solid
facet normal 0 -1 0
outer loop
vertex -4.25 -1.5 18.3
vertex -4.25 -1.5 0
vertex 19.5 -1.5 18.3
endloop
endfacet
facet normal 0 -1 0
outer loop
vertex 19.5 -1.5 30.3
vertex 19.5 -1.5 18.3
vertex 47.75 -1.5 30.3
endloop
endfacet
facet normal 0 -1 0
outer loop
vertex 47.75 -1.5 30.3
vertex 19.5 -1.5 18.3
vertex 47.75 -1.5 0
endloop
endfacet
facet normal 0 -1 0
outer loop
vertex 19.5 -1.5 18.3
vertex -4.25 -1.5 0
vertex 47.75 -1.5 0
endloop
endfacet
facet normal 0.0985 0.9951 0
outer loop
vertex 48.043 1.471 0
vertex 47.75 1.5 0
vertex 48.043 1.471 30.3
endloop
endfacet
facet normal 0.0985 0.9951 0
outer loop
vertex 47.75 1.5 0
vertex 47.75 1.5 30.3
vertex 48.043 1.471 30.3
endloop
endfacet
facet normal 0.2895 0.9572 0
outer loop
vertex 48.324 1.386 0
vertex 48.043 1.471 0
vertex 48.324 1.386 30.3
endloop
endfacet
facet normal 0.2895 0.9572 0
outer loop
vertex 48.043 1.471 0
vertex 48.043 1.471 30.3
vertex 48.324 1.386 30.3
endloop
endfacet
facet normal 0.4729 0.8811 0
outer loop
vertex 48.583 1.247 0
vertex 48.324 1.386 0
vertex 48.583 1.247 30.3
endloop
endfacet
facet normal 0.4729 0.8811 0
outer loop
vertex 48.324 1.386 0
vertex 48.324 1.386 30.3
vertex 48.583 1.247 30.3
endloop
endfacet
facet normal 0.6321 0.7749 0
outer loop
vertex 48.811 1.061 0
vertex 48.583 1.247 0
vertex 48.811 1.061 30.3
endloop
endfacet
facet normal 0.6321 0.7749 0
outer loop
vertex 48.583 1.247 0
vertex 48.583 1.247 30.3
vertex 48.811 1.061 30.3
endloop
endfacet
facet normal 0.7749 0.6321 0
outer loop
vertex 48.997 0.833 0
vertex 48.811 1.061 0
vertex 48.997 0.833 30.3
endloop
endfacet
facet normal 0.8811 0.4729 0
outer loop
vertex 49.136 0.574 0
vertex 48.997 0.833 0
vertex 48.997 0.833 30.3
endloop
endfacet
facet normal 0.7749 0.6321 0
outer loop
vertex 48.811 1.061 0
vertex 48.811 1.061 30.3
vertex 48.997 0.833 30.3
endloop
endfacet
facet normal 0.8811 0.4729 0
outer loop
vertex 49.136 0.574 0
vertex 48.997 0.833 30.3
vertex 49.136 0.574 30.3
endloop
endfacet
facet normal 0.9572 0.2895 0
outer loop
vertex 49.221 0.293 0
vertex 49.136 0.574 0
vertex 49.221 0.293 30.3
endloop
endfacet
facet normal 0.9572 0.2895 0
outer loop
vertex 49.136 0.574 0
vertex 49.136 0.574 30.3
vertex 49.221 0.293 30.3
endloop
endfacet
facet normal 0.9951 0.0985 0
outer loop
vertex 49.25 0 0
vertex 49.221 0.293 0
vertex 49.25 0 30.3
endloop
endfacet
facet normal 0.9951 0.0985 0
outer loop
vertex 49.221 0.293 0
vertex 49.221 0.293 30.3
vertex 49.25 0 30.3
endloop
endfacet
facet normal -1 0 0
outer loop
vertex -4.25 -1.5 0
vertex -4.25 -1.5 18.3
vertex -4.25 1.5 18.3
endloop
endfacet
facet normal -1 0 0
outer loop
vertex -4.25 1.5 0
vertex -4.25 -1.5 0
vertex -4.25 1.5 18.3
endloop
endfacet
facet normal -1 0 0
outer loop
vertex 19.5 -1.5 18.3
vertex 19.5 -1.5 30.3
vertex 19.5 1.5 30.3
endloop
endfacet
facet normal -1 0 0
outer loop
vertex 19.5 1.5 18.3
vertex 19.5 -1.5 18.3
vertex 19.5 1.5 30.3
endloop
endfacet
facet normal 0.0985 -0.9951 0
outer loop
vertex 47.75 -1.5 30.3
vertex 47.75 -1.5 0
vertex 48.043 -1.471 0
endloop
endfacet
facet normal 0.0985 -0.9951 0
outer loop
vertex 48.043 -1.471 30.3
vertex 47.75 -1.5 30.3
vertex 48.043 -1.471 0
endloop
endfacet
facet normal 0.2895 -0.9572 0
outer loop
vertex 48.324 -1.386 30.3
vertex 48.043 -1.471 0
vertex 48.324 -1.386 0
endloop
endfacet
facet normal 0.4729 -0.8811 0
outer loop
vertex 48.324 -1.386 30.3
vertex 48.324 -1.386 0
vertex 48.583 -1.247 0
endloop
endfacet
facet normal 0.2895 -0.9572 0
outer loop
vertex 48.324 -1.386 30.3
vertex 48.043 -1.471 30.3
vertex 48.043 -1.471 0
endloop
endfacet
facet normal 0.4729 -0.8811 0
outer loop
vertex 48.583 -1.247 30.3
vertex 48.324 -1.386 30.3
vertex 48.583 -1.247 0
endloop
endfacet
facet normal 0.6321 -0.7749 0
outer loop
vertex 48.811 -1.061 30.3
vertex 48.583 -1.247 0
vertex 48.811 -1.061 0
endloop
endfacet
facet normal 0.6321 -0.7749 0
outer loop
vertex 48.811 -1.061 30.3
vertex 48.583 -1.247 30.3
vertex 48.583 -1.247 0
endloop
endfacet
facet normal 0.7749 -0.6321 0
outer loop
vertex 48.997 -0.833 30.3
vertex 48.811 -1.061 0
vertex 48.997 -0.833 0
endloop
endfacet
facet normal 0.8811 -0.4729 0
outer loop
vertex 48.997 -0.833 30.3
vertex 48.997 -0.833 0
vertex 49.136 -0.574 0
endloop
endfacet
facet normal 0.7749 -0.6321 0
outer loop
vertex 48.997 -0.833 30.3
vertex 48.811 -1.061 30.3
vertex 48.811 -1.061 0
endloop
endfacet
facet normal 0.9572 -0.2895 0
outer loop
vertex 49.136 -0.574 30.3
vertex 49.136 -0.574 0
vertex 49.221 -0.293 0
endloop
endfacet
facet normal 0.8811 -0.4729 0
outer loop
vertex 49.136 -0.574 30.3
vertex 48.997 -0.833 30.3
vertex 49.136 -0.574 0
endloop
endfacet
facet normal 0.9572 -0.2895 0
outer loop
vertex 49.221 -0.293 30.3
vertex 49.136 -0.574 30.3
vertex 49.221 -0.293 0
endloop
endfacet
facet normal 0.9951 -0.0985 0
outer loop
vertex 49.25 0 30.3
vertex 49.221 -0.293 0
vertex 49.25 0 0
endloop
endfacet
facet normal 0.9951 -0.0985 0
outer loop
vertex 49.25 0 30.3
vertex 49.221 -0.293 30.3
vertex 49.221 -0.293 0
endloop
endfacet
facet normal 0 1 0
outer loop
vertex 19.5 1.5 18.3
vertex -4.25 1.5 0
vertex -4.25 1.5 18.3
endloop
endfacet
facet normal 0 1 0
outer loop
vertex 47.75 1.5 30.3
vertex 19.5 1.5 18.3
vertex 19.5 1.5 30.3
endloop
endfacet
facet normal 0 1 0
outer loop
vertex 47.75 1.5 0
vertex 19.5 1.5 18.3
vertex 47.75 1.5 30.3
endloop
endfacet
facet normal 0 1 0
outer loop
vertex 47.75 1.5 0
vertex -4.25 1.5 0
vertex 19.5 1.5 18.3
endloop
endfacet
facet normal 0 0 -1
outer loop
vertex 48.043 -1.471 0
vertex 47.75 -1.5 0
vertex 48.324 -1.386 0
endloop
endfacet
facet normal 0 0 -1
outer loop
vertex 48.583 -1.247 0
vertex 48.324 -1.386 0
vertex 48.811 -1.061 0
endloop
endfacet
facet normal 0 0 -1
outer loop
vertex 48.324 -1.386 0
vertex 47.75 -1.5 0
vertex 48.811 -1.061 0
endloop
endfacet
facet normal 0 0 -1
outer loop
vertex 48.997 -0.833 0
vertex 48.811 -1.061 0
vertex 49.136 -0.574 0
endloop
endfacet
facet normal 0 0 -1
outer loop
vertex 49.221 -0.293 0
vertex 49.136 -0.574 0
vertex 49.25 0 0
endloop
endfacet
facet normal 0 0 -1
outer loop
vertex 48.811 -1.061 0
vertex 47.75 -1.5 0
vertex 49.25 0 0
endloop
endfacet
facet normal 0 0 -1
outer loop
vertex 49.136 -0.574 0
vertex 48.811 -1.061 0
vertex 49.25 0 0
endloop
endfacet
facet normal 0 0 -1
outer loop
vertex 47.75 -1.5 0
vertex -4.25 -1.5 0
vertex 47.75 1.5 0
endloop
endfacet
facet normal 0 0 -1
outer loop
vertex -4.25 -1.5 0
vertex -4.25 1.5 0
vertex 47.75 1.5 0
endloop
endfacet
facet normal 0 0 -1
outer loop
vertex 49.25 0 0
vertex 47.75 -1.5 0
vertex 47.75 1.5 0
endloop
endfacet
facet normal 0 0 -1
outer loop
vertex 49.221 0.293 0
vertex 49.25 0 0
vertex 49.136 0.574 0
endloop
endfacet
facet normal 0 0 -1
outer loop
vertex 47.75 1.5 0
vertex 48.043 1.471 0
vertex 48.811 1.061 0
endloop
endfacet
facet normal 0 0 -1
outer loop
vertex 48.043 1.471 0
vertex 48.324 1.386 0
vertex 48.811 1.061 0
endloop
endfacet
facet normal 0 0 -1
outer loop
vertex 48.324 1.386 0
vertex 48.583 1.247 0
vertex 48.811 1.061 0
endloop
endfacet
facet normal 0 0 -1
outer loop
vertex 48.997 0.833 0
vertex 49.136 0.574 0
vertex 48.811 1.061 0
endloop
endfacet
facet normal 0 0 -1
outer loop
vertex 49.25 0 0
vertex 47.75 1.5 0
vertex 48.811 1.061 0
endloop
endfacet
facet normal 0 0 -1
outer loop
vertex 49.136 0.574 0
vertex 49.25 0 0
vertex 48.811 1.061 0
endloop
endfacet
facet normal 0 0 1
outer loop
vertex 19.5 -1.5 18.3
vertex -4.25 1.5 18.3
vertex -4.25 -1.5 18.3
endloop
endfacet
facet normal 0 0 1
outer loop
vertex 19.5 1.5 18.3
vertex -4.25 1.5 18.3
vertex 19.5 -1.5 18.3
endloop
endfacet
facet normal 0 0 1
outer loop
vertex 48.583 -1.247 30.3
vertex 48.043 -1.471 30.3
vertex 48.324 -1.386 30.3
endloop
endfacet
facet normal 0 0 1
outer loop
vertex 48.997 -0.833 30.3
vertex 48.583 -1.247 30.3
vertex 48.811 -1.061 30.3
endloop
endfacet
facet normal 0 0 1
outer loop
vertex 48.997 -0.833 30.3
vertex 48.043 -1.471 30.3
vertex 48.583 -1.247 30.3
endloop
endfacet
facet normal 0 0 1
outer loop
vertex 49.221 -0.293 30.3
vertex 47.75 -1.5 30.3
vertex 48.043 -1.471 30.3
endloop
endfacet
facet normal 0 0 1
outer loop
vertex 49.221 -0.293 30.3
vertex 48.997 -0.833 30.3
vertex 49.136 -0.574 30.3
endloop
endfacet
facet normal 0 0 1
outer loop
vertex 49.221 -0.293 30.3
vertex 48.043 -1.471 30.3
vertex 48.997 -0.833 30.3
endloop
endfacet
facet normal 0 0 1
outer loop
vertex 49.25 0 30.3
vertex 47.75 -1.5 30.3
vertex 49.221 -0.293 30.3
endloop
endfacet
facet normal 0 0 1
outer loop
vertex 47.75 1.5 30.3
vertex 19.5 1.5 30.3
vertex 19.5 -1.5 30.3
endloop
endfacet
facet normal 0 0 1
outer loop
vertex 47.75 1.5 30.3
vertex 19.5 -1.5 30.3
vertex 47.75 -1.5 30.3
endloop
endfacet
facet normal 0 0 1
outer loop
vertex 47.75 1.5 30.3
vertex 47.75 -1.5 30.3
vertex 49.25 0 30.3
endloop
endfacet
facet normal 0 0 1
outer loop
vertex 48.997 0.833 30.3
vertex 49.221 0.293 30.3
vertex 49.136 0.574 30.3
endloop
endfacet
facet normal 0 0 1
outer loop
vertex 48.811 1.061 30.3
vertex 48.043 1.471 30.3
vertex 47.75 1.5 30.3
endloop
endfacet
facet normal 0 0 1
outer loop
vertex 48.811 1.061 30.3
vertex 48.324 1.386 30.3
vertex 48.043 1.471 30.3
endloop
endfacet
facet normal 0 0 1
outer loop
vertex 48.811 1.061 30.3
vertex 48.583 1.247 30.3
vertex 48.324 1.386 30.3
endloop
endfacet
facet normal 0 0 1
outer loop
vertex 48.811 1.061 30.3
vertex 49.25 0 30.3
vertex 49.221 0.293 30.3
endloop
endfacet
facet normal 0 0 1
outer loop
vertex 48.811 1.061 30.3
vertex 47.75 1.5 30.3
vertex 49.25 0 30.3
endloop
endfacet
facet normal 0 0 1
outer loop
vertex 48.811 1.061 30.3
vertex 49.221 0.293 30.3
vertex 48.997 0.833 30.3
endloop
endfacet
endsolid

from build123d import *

# Parameters (mm, degrees)
SKETCH1_W           = 53.5
SKETCH1_H           = 3
BOSS_EXTRUDE1_DEPTH = 30.3
SKETCH2_W           = 23.75
SKETCH2_H           = 3
CUT_EXTRUDE1_DEPTH  = 12
FILLET1_R           = 1.5


with BuildPart() as part:
    # Sketch1 → Boss-Extrude1 (new body)
    with BuildSketch(Plane.XY):
        with Locations((22.5, 0)):
            Rectangle(SKETCH1_W, SKETCH1_H)
    extrude(amount=BOSS_EXTRUDE1_DEPTH)

    # Sketch2 → Cut-Extrude1 (cut)
    with BuildSketch(Plane.XY.offset(30.3)):
        with Locations((7.625, 0)):
            Rectangle(SKETCH2_W, SKETCH2_H)
    extrude(amount=-CUT_EXTRUDE1_DEPTH, mode=Mode.SUBTRACT)

    # Fillet1
    fillet1_edges = [part.edges().sort_by_distance(p)[0] for p in [
        (49.25, -1.5, 15.15),
        (49.25, 1.5, 15.15),
    ]]
    fillet(fillet1_edges, radius=FILLET1_R - 0.0001)  # a hair under: the kernel refuses the full size


solid = part.part
